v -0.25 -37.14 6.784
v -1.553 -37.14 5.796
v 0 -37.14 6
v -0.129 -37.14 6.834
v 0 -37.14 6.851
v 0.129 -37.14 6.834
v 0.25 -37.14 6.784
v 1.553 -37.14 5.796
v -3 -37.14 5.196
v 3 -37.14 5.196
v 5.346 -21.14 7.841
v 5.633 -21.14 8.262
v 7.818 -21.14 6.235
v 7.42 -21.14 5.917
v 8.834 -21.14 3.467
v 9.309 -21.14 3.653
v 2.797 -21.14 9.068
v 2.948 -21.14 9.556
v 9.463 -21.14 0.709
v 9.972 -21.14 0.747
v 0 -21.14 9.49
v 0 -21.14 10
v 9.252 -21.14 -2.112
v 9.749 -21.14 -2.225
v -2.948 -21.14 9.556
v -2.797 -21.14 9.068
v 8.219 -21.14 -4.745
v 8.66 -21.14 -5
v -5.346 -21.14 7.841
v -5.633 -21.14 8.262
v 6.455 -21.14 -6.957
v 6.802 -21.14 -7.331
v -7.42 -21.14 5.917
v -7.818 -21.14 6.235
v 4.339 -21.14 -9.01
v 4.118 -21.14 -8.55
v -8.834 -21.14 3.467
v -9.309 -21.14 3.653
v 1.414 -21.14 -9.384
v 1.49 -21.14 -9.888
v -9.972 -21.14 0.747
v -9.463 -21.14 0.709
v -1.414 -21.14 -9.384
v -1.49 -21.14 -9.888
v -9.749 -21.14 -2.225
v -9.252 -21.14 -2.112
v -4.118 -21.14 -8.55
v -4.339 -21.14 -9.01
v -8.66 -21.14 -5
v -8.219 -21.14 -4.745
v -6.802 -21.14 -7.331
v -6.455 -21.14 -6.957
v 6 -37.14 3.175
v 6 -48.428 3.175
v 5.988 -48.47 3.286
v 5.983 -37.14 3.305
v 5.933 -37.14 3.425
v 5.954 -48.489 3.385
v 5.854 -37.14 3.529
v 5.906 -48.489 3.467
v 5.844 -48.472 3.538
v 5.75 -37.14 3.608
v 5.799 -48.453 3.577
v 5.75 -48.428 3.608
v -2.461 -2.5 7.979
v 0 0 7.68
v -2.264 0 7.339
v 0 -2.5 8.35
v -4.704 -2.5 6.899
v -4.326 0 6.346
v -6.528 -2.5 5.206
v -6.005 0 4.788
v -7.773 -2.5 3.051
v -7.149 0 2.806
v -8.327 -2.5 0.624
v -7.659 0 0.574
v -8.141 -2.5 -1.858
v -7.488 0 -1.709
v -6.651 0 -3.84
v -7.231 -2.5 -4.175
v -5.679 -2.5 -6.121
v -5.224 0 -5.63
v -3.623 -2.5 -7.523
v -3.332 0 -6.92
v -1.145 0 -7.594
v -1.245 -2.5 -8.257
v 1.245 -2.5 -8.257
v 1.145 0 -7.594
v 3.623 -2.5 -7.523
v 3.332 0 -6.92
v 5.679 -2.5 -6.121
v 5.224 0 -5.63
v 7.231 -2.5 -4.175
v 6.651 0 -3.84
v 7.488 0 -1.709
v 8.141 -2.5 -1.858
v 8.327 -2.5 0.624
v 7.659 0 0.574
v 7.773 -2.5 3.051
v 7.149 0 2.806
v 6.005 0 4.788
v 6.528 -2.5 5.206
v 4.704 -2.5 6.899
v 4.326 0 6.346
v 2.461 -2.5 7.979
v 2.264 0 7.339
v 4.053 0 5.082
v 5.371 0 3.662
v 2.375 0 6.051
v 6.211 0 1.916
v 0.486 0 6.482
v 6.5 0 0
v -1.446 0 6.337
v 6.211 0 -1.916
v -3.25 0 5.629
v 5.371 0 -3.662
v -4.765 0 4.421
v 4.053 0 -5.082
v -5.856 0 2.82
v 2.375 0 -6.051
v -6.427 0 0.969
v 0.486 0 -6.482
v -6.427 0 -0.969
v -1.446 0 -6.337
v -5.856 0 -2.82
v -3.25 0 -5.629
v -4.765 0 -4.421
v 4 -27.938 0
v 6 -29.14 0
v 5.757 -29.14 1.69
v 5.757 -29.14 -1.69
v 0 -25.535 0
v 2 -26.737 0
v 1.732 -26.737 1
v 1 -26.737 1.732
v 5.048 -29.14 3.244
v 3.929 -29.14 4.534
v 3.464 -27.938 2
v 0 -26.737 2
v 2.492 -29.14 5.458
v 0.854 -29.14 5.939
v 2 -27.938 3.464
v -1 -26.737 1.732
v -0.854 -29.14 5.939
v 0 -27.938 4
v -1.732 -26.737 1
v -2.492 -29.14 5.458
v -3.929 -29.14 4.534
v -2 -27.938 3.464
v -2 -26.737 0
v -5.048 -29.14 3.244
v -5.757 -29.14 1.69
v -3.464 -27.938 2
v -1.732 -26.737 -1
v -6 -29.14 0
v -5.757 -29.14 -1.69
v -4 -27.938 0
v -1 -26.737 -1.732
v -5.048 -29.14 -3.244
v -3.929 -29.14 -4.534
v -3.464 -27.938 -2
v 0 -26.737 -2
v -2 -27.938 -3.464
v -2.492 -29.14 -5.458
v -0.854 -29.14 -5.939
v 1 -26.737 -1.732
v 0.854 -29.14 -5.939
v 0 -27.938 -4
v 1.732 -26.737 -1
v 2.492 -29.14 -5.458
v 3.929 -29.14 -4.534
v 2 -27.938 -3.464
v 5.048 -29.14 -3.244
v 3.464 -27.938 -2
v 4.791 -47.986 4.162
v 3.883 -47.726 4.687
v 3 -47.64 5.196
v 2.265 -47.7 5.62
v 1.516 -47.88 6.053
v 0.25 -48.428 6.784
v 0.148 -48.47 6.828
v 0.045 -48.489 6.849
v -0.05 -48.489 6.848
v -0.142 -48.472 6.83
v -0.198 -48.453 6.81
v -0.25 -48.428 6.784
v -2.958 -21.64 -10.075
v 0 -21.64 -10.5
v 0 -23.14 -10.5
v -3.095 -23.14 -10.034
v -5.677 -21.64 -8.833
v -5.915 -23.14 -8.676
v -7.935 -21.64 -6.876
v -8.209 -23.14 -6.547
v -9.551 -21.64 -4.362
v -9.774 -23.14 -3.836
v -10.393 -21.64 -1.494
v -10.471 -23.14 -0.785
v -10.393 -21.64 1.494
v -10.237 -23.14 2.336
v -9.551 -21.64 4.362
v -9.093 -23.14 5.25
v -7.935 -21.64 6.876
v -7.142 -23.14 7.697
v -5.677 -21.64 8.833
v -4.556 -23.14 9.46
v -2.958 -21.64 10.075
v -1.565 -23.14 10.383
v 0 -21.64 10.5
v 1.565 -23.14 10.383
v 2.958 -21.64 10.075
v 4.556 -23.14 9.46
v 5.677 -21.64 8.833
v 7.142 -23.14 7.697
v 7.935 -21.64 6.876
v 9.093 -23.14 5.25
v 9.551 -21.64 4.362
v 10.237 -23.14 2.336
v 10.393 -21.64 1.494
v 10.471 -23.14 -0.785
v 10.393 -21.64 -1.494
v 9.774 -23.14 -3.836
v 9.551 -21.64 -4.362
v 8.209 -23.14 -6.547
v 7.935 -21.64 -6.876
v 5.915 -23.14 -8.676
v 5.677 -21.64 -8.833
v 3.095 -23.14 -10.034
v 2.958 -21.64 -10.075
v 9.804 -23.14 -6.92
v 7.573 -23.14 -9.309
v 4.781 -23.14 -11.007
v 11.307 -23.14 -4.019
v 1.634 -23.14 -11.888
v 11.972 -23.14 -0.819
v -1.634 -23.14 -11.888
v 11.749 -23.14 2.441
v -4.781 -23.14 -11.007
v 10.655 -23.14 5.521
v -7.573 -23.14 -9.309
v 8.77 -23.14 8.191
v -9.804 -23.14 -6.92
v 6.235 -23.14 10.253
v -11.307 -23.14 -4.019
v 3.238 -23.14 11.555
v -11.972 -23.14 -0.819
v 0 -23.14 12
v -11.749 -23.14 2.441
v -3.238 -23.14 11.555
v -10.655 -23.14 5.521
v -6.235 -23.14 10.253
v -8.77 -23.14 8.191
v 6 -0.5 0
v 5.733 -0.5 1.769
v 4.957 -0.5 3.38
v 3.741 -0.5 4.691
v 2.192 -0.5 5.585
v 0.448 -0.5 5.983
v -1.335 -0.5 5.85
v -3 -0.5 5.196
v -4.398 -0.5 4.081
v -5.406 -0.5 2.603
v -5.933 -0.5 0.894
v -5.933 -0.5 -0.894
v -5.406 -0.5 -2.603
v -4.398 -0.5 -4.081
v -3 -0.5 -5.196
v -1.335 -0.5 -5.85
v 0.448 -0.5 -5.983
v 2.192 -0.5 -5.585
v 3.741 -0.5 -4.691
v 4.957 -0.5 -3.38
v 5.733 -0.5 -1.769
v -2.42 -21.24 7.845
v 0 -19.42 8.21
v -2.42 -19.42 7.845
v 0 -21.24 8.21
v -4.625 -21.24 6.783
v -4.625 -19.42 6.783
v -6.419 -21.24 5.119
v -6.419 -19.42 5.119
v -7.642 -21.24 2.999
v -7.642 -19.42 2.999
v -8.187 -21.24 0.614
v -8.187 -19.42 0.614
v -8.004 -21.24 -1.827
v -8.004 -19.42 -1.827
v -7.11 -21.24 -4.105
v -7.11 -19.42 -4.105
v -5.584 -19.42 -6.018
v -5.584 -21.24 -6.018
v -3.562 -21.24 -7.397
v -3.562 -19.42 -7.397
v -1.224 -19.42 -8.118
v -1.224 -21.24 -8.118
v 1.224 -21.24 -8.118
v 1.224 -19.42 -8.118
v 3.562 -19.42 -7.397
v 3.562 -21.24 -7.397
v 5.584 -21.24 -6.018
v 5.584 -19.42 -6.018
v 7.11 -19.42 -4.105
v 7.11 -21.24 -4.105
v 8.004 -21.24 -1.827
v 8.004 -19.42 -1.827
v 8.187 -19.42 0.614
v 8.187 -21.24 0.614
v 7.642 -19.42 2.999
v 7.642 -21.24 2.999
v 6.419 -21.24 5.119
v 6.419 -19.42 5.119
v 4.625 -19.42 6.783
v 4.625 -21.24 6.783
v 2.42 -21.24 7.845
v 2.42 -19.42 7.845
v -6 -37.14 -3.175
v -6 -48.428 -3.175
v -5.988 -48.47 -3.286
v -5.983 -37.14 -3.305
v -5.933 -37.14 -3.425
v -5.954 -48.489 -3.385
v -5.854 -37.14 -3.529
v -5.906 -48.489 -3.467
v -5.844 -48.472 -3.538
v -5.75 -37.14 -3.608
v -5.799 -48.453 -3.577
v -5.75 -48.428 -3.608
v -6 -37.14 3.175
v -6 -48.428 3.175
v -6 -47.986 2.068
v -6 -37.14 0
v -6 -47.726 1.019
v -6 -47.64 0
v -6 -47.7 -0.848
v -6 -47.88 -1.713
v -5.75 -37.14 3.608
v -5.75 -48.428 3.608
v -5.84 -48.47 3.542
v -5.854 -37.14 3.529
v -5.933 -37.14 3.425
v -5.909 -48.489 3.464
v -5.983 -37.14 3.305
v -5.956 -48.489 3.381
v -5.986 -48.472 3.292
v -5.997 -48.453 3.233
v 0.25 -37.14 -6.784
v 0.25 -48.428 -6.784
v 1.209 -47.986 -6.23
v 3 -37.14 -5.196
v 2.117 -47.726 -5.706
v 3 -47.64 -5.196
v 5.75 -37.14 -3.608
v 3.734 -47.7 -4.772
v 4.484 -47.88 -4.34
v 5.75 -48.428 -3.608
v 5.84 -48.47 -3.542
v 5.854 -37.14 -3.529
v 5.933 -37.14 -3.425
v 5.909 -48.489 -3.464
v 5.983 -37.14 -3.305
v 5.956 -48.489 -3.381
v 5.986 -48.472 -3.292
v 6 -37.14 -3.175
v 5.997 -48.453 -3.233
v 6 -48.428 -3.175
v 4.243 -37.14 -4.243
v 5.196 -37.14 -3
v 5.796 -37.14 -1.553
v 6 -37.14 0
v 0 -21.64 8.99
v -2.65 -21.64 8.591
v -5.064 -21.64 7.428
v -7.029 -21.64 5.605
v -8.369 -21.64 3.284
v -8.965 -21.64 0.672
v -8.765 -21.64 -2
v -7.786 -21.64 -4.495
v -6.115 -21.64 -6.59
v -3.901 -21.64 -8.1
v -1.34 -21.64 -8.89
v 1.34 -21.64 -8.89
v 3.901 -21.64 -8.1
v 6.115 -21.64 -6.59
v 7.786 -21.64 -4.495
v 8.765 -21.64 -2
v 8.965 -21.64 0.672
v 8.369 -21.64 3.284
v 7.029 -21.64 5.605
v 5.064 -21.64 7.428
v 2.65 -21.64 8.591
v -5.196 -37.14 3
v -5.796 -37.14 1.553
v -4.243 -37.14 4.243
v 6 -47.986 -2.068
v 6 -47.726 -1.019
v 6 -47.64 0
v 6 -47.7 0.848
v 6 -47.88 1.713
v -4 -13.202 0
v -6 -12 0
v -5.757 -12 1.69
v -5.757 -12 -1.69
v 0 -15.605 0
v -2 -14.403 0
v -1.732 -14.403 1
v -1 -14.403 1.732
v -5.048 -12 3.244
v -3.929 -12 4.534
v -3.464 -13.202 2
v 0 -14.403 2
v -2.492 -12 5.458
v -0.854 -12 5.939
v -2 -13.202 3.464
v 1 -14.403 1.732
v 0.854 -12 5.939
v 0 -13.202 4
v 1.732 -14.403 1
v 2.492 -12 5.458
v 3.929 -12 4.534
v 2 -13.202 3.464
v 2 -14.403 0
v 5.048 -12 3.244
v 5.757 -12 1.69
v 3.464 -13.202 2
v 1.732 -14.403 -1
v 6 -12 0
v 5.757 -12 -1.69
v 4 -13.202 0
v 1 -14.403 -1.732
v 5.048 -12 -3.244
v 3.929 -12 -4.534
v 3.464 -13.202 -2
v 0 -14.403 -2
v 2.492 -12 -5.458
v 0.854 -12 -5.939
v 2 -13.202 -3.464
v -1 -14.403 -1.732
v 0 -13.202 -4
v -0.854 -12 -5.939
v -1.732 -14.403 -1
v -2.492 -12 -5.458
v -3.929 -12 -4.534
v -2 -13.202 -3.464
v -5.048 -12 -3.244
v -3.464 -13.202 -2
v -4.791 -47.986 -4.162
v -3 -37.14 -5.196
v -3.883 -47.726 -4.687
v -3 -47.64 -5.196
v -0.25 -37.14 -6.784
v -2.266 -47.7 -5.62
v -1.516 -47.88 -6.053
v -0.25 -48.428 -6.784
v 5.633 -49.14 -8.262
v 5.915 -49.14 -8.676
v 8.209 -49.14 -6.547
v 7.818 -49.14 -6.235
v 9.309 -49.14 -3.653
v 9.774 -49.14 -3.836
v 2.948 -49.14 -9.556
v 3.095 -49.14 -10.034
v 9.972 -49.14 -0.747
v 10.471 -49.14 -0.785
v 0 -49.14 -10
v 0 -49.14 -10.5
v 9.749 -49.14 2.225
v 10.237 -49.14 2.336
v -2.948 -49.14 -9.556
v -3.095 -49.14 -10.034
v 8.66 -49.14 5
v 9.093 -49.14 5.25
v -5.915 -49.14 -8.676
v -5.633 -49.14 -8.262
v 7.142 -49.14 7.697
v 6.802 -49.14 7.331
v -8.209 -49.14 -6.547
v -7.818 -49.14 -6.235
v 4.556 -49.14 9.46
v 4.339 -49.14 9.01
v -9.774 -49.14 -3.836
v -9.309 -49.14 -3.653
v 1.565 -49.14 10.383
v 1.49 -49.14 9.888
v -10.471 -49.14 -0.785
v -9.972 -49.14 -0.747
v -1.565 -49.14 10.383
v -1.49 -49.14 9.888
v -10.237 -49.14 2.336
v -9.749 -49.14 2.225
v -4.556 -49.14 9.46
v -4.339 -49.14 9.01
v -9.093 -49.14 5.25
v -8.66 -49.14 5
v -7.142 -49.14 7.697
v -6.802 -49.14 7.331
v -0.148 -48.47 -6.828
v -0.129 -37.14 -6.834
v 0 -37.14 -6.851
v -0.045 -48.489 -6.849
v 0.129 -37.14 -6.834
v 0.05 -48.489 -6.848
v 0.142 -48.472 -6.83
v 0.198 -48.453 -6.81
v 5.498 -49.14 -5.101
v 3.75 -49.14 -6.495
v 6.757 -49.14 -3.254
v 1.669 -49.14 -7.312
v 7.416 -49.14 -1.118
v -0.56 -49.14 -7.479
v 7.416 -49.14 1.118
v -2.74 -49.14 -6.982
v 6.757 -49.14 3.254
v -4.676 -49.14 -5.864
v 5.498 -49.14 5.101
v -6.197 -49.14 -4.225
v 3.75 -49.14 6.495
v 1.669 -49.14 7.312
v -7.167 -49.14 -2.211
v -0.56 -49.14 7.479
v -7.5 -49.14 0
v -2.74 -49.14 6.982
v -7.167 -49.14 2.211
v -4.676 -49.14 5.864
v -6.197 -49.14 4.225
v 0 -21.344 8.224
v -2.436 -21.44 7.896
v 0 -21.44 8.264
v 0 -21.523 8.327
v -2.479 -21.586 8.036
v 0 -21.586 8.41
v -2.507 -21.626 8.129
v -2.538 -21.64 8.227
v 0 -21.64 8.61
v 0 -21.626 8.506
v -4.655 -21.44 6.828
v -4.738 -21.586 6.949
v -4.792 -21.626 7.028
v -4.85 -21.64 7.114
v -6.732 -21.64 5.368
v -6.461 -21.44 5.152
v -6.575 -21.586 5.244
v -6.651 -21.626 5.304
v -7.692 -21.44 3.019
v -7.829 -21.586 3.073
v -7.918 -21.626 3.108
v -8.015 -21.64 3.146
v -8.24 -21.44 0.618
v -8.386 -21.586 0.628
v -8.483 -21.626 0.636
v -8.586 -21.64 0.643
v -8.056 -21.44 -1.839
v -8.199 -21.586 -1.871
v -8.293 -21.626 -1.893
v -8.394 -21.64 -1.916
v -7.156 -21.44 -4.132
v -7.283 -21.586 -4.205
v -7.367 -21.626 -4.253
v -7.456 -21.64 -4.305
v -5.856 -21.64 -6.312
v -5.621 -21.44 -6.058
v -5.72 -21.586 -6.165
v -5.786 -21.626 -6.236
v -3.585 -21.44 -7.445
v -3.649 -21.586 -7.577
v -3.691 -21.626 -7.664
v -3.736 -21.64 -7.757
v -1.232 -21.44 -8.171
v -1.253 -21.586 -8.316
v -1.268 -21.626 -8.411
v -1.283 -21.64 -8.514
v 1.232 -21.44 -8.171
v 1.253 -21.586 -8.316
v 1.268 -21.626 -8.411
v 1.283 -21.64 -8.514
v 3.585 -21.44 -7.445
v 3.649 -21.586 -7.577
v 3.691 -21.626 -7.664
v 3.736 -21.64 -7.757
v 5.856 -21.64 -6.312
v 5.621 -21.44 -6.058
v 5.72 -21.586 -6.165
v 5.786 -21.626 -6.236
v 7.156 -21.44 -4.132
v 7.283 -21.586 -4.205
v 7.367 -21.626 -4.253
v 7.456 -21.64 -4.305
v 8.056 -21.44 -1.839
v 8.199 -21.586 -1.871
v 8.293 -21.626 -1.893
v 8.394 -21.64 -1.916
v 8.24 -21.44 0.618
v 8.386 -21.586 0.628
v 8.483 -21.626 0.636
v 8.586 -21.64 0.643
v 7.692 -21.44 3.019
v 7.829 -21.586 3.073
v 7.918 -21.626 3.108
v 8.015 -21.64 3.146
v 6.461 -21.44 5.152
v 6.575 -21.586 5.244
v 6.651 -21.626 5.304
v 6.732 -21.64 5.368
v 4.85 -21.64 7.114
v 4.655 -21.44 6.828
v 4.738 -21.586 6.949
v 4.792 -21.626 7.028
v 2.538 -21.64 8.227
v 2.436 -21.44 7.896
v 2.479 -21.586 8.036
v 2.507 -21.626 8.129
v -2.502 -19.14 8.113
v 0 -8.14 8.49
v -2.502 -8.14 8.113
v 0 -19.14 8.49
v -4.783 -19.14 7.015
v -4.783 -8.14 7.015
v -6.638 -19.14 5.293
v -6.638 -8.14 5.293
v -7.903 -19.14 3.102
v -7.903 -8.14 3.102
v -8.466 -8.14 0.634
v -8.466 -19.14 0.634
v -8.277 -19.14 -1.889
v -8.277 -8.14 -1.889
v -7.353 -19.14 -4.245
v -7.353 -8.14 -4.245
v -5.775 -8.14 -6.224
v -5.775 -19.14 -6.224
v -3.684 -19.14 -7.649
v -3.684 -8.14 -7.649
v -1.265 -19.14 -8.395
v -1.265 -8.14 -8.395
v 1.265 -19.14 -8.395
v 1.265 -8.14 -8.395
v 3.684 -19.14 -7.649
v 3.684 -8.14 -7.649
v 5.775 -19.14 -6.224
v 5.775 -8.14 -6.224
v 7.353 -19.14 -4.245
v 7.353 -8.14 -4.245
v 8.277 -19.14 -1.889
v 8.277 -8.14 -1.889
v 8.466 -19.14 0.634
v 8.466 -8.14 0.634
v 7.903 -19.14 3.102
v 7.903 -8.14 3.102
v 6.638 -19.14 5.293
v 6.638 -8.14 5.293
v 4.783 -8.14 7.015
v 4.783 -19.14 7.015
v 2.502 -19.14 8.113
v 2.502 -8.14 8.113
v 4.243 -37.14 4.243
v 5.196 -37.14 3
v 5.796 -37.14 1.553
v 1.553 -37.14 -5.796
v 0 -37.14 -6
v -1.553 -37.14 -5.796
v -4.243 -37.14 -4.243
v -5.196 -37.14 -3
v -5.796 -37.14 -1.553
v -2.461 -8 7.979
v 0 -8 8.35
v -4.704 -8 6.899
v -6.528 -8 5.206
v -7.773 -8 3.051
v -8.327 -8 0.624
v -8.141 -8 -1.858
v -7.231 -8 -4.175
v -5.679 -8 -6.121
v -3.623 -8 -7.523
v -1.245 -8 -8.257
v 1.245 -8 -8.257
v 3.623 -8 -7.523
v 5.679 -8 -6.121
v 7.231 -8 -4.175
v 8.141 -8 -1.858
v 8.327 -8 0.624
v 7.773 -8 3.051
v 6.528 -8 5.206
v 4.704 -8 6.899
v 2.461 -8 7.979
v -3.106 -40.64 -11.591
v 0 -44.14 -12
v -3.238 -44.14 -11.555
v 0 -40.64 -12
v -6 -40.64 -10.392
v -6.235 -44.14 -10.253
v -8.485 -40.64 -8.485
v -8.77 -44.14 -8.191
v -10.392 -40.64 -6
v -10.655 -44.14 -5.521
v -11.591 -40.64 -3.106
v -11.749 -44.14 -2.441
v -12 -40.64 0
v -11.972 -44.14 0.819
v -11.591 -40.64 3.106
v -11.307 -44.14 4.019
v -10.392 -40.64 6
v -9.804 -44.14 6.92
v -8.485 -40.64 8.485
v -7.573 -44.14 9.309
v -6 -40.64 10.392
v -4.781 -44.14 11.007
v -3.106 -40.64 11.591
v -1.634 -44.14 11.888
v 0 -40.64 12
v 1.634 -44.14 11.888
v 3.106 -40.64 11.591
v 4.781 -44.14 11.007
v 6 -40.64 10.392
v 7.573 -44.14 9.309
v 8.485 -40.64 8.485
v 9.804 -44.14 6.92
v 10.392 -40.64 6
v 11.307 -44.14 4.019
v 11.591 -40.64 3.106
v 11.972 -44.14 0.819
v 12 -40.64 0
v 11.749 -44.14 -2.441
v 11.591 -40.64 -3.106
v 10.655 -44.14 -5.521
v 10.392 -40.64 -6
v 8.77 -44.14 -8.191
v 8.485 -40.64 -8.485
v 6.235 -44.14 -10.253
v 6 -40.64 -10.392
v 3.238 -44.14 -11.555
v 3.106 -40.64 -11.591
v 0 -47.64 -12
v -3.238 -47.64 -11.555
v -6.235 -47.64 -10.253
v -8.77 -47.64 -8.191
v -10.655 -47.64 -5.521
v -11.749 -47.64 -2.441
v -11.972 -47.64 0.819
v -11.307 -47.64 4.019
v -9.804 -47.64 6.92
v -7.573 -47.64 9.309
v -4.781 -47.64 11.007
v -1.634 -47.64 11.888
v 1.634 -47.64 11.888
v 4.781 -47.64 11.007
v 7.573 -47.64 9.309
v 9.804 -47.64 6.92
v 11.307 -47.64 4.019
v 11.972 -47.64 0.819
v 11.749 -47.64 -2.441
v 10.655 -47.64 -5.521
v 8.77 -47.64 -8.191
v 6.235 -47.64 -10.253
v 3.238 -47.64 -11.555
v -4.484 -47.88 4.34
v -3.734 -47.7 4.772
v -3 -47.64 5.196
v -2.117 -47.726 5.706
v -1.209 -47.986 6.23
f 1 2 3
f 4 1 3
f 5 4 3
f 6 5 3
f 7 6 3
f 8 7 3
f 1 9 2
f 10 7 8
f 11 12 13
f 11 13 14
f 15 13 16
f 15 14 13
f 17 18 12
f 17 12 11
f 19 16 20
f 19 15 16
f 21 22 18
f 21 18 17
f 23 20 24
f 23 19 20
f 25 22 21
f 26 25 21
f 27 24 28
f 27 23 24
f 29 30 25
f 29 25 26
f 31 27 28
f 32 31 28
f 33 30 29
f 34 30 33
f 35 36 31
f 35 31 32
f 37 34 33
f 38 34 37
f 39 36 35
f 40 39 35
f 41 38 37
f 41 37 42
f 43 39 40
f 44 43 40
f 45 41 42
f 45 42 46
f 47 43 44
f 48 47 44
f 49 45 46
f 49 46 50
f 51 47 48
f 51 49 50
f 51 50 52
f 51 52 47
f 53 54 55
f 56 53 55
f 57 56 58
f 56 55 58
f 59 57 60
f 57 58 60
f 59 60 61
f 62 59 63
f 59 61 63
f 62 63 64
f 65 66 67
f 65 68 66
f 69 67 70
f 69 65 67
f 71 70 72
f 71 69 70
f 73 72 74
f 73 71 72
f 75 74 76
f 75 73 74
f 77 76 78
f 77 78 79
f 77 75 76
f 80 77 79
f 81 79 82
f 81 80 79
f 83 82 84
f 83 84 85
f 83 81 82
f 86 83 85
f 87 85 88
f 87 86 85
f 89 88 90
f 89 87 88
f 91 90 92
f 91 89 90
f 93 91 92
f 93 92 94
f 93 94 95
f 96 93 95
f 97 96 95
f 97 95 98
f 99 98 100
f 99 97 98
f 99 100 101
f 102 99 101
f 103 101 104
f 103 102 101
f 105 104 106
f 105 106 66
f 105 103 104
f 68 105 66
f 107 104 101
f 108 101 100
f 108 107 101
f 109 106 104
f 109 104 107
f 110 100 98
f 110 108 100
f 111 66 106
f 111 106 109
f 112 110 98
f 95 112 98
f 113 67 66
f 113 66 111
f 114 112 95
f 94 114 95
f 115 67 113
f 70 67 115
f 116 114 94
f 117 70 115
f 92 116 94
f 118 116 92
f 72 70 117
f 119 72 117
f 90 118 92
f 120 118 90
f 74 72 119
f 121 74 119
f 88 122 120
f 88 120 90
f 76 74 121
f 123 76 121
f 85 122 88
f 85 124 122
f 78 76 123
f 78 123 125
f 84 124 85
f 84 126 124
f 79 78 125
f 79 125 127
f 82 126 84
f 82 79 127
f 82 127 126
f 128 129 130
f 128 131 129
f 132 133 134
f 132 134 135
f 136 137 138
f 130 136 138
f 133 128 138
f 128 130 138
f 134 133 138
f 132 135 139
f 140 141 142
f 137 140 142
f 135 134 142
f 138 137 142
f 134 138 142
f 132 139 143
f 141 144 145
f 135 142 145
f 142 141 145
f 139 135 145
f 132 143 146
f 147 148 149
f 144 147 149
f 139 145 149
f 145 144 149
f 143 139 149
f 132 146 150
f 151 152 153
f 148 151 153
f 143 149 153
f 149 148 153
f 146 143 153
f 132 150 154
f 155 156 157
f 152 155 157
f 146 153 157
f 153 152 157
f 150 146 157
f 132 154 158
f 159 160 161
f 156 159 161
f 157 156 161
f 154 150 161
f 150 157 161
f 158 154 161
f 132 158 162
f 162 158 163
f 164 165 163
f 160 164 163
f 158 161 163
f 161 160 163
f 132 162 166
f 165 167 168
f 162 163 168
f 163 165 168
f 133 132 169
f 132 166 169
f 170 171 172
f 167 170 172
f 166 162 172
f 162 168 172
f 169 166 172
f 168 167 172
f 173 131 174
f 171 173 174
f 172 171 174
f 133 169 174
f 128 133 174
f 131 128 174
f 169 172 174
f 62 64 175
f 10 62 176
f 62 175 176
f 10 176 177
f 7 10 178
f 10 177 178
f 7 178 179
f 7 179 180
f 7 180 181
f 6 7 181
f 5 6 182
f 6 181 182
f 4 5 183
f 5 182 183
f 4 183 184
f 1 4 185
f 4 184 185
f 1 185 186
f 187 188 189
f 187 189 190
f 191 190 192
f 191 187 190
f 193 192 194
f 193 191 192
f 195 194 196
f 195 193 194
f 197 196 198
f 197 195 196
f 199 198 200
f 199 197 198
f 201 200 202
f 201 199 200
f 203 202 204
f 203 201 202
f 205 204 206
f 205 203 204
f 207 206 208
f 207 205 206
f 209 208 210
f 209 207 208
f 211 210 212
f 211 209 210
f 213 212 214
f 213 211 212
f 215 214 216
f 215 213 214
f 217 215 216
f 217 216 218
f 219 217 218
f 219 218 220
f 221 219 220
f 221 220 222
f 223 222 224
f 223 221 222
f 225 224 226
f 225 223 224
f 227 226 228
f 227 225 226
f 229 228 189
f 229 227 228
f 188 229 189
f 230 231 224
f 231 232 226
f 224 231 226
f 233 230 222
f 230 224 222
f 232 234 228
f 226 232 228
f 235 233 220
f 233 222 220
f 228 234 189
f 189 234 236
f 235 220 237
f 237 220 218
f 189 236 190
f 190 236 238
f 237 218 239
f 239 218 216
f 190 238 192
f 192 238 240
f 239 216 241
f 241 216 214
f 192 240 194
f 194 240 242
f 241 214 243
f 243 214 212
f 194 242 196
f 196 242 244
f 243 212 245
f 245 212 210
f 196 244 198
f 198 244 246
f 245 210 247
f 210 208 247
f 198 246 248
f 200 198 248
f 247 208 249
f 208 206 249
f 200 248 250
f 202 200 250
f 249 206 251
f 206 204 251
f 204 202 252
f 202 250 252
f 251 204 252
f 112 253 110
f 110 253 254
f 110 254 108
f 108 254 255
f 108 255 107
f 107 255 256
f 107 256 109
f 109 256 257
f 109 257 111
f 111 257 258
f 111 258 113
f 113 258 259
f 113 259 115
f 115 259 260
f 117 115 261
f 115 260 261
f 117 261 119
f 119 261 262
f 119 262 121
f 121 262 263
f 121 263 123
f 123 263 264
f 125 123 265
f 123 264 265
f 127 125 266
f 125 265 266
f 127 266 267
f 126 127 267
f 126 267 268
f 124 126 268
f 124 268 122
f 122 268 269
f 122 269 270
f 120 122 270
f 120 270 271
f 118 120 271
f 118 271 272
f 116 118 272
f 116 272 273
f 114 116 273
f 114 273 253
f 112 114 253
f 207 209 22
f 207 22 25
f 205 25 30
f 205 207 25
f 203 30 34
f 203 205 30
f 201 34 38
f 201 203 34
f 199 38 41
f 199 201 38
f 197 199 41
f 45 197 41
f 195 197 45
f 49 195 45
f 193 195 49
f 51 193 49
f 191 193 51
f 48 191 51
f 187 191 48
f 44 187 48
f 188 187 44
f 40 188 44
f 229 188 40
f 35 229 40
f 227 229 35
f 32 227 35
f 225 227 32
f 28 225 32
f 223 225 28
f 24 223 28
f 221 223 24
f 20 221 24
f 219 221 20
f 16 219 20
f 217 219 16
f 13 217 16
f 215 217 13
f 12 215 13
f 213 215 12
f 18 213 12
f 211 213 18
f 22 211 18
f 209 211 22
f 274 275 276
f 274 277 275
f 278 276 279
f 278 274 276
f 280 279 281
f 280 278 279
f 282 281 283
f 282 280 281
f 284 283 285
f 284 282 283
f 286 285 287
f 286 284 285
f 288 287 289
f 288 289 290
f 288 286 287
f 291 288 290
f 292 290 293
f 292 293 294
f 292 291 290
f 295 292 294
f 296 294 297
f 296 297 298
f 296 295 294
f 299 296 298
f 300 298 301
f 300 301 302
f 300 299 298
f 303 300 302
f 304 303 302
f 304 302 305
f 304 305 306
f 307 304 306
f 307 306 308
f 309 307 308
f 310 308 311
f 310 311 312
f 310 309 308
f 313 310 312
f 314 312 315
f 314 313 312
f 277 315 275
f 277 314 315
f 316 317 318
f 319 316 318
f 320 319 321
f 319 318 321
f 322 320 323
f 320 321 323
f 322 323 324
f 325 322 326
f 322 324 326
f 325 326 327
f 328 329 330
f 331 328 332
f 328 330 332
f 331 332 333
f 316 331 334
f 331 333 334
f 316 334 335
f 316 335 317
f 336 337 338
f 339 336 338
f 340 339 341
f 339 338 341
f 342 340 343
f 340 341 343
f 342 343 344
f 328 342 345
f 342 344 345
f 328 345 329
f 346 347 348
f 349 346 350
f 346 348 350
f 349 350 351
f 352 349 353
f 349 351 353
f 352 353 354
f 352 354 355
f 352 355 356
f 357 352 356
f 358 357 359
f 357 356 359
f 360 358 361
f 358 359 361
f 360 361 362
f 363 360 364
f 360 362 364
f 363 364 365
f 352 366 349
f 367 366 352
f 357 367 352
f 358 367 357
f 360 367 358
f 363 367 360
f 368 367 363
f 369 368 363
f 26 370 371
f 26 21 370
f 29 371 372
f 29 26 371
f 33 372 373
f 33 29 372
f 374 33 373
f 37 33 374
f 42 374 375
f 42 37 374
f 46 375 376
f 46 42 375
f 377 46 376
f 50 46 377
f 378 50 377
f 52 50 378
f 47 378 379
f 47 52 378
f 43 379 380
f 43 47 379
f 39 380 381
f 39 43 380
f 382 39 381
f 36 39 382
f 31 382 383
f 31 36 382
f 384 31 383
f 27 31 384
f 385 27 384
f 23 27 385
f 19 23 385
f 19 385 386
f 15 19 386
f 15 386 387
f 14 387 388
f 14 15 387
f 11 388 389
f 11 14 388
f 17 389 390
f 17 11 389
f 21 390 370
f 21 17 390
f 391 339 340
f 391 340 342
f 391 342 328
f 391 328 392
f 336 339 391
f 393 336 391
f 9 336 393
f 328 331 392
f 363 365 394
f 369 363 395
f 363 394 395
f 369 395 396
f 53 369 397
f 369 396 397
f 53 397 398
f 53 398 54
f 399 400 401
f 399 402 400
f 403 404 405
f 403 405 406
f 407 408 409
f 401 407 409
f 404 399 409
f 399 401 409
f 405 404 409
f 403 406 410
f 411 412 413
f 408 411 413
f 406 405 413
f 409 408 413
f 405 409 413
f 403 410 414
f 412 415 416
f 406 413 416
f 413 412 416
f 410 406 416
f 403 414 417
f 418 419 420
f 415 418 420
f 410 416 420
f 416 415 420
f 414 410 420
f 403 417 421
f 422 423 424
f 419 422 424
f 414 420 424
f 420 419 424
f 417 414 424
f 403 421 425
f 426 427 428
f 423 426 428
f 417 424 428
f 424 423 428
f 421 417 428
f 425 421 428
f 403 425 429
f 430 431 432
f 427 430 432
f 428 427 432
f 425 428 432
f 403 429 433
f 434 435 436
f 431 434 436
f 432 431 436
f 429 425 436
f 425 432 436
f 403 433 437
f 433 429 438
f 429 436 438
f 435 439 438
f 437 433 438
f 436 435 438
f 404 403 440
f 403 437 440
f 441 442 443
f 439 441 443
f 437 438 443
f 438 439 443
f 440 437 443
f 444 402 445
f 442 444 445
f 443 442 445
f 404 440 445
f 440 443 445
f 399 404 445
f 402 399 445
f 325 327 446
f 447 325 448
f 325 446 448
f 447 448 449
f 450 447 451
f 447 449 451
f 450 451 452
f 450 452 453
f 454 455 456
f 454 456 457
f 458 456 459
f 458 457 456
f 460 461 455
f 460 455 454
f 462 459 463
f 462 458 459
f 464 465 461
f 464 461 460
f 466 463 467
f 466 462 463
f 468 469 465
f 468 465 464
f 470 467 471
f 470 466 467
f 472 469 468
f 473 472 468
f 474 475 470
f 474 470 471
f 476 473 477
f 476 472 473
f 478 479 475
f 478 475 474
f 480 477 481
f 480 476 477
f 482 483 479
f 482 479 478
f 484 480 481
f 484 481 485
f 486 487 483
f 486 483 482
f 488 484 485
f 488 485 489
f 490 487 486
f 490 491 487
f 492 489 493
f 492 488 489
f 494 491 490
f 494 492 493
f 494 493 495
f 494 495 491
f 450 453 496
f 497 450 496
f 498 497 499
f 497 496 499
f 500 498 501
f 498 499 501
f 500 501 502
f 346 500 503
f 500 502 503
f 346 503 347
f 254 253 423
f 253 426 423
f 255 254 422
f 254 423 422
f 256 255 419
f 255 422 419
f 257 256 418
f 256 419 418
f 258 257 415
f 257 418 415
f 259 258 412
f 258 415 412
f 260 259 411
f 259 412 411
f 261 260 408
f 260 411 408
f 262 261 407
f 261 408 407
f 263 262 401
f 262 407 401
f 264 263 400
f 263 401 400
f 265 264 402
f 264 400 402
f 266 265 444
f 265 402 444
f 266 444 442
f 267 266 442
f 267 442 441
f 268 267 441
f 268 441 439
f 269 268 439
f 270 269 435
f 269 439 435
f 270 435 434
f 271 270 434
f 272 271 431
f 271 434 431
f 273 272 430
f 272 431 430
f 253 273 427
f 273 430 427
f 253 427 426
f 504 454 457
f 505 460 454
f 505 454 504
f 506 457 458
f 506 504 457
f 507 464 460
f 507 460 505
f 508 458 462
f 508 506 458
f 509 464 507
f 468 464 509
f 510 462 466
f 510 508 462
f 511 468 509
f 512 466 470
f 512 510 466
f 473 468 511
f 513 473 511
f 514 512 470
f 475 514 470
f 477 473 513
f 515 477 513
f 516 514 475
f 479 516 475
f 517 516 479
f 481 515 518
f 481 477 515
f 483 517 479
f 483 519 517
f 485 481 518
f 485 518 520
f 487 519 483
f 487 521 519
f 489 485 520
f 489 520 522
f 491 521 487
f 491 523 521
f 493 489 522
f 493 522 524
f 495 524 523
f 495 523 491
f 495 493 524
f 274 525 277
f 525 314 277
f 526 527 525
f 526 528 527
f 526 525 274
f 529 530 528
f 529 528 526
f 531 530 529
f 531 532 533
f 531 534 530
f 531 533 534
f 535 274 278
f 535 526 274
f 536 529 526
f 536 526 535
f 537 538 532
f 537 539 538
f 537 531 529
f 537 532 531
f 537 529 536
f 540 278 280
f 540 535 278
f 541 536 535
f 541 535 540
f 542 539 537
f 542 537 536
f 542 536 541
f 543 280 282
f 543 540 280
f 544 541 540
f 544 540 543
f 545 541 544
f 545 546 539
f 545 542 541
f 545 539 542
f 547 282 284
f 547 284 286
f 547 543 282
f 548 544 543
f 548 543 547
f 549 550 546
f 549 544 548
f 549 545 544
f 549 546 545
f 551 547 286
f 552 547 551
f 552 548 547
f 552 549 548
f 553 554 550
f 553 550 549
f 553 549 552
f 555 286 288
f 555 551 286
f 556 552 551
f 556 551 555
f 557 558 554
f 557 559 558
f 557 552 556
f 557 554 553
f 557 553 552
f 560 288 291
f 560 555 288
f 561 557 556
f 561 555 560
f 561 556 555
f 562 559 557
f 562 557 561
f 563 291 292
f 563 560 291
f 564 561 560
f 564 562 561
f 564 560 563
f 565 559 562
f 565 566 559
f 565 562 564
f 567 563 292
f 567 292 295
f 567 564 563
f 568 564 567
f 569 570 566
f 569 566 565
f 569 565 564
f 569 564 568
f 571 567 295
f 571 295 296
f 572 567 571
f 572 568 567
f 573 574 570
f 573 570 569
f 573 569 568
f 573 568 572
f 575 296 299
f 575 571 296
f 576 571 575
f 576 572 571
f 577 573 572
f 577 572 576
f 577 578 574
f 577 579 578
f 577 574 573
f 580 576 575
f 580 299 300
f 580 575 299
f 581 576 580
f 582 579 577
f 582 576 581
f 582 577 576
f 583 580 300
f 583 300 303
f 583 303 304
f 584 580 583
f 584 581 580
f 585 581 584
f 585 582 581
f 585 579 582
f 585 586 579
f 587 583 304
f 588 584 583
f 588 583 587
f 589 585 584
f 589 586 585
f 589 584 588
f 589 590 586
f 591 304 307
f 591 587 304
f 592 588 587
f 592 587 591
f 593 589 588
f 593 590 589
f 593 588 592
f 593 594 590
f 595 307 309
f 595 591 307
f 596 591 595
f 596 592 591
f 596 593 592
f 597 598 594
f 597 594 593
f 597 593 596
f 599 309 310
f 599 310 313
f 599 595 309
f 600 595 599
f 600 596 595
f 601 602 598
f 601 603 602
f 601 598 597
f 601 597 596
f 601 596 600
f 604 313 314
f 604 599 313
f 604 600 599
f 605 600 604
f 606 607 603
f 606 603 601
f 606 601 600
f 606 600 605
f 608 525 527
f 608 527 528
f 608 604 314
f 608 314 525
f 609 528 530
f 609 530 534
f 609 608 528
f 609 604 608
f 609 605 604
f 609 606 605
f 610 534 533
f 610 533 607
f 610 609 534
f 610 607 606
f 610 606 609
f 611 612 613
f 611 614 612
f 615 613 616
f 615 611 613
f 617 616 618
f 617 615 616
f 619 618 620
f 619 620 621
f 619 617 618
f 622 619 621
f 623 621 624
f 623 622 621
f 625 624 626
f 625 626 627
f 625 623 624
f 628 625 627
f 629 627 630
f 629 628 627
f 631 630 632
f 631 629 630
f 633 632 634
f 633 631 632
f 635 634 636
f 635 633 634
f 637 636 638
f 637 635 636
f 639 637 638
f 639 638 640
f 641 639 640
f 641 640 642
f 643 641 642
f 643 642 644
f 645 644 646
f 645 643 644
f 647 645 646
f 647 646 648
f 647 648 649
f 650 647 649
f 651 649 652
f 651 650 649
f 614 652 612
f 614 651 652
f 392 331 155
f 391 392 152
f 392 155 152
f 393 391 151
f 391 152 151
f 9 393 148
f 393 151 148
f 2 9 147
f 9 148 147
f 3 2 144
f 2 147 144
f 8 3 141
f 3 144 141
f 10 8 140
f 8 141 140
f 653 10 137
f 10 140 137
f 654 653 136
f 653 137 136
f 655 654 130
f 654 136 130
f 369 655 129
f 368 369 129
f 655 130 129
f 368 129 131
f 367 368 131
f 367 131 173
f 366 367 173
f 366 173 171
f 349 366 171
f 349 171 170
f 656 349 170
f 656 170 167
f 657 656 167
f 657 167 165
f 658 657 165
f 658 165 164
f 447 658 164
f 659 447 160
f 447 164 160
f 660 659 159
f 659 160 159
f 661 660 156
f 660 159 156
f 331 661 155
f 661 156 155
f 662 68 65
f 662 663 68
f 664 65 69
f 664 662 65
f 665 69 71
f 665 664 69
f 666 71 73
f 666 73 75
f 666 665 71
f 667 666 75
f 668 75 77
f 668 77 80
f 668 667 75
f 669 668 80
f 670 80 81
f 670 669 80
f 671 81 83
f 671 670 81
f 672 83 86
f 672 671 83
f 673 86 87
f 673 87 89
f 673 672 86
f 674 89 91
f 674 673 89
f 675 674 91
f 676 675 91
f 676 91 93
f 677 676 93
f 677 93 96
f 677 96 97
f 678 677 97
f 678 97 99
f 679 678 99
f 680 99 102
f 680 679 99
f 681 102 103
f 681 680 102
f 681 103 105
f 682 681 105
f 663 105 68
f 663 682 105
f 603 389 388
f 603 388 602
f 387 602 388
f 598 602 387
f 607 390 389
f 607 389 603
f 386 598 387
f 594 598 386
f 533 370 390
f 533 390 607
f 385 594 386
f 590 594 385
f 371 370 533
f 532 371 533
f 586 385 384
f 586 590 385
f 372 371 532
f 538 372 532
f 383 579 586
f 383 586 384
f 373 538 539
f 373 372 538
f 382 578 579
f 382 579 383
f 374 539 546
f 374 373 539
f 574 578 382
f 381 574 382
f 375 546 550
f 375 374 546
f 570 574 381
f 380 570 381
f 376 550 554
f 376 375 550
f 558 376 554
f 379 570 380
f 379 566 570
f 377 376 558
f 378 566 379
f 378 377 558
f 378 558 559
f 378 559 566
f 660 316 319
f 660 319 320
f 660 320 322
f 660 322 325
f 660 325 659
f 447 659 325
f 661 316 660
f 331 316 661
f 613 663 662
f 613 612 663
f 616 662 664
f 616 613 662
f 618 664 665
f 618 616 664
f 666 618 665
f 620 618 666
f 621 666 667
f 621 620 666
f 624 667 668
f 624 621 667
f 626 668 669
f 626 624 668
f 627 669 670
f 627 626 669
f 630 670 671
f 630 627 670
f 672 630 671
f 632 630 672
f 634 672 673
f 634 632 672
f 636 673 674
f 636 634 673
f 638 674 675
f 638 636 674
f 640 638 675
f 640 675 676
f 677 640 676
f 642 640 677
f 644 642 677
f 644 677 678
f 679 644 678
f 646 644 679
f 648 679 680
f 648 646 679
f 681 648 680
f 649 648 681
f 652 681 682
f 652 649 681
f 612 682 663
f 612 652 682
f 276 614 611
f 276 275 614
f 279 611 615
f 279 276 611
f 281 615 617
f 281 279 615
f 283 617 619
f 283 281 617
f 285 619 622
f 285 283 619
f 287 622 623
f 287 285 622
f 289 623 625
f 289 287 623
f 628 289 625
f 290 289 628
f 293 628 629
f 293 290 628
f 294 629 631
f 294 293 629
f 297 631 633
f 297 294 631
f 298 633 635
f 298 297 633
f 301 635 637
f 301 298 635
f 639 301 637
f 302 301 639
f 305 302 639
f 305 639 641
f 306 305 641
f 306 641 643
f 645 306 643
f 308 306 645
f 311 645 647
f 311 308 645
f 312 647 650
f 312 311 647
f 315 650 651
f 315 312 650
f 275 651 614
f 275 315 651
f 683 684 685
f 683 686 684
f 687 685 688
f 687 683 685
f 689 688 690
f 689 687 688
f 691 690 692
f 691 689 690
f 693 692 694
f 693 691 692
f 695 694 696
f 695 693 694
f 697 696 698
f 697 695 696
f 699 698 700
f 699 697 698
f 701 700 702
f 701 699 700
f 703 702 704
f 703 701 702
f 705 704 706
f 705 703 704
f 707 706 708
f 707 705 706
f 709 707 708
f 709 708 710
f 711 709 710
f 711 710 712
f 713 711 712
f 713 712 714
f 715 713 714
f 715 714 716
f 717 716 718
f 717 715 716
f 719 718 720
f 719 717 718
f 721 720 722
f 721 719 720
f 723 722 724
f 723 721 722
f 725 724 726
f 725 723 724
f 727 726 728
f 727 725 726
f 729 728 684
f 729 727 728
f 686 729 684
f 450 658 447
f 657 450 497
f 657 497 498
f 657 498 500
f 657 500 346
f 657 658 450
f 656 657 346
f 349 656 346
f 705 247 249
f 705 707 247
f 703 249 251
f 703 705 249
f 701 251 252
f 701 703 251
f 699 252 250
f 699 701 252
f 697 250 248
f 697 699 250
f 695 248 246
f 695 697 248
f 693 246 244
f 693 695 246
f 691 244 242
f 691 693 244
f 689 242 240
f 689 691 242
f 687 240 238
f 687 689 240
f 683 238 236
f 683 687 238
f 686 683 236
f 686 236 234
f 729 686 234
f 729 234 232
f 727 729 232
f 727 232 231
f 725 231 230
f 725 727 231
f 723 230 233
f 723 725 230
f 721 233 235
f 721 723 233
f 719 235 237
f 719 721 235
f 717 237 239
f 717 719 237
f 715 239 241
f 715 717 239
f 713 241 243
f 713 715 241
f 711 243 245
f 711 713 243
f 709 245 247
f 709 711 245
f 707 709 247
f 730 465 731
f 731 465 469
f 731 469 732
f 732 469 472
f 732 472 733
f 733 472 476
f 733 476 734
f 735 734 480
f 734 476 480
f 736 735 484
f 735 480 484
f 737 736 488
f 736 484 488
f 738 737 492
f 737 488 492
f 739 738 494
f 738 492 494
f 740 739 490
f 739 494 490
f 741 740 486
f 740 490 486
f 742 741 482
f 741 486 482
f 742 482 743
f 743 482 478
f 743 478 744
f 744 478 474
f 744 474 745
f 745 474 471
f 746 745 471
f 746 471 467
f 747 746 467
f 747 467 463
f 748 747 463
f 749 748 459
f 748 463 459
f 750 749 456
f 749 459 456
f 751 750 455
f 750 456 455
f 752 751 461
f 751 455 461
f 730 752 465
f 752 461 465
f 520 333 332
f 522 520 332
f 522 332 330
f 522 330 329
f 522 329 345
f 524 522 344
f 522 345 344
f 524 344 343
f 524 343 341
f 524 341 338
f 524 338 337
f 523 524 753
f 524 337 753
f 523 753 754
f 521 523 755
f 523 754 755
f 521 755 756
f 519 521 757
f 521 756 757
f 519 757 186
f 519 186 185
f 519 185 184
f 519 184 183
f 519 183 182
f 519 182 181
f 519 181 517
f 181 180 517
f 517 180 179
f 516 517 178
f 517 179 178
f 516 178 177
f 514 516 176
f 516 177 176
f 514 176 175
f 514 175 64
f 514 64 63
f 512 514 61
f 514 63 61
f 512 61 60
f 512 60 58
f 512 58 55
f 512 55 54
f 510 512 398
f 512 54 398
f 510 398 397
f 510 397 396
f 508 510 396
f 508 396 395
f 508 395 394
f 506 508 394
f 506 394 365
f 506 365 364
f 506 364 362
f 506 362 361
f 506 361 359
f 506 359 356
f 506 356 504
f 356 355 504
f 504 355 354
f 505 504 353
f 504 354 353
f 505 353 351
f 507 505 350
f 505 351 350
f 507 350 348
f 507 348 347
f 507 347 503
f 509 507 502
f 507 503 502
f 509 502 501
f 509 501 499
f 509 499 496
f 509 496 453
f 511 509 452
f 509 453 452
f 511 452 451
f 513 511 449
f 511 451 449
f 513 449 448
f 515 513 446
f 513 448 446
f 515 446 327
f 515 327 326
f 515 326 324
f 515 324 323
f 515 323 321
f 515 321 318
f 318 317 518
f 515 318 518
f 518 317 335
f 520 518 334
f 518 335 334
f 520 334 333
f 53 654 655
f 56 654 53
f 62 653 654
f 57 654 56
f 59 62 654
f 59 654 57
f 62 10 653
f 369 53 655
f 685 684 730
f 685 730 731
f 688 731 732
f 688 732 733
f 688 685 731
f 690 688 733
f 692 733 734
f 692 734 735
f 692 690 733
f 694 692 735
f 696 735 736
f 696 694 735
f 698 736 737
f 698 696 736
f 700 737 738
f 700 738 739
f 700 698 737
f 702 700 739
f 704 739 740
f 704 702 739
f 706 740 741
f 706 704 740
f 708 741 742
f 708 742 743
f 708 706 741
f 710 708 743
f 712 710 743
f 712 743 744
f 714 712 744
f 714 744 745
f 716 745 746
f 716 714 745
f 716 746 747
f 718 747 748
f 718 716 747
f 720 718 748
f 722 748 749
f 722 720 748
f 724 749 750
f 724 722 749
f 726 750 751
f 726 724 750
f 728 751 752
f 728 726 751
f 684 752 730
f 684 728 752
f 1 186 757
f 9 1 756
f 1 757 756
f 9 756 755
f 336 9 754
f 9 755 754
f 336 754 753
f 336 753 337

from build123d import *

# Parameters (mm, degrees)
PER_AGE_T_TE_D           = 12
PER_AGE_T_TE_DEPTH       = 20
PER_AGE_T_TE_CSINK_D     = 15
PER_AGE_T_TE_CSINK_ANGLE = 90
PER_AGE_T_TE_TIP         = 3.605163714
H_XAGONE_DEPTH           = 12
CENTRAGE_D               = 3
CENTRAGE_DEPTH           = 6
CENTRAGE_CSINK_D         = 5
CENTRAGE_CSINK_ANGLE     = 60
CENTRAGE_TIP             = 0.901290929
PER_AGE_AXE_D            = 12
PER_AGE_AXE_DEPTH        = 12
PER_AGE_AXE_CSINK_D      = 13
PER_AGE_AXE_CSINK_ANGLE  = 90
PER_AGE_AXE_TIP          = 3.605163714
ESQUISSE9_W              = 7
ESQUISSE9_H              = 8.5
ESQUISSE9_W_2            = 1.5
ESQUISSE9_H_2            = 2
ESQUISSE10_W             = 2
ESQUISSE10_H             = 8.5
CHANFREIN1_SIZE          = 1.5


with BuildPart() as part:
    # Esquisse1 → Base-Révolution (revolve)
    with BuildSketch(Plane.XY, mode=Mode.PRIVATE) as base_r_volution_sk:
        with BuildLine():
            Line((0, 0), (7.680127019, 0))
            Line((7.680127019, 0), (8.35, -2.5))
            Line((8.35, -2.5), (8.35, -8))
            Line((8.35, -8), (8.49, -8.14))
            Line((8.49, -8.14), (8.49, -19.14))
            Line((8.49, -19.14), (8.21, -19.42))
            Line((8.21, -19.42), (8.21, -21.24))
            ThreePointArc((8.21, -21.24), (8.327157288, -21.522842712), (8.61, -21.64))
            Line((8.61, -21.64), (8.99, -21.64))
            Line((8.99, -21.64), (9.49, -21.14))
            Line((9.49, -21.14), (10, -21.14))
            Line((10, -21.14), (12, -23.14))
            Line((12, -23.14), (12, -40.64))
            Line((12, -40.64), (10, -42.64))
            Line((10, -42.64), (10, -43.14))
            ThreePointArc((10, -43.14), (10.292893219, -43.847106781), (11, -44.14))
            Line((11, -44.14), (19, -44.14))
            Line((19, -44.14), (19, -45.14))
            Line((19, -45.14), (12.07179677, -49.14))
            Line((12.07179677, -49.14), (0, -49.14))
            Line((0, -49.14), (0, 0))
        make_face()
    revolve(base_r_volution_sk.sketch.rotate(Axis((0, -10, 0), (0, -1, 0)), 90), axis=Axis((0, -10, 0), (0, -1, 0)))

    # Perçage tête
    with Locations(Plane.XZ.offset(49.14)):
        with Locations((0, 0)):
            CounterSinkHole(PER_AGE_T_TE_D / 2, PER_AGE_T_TE_CSINK_D / 2, depth=PER_AGE_T_TE_DEPTH, counter_sink_angle=PER_AGE_T_TE_CSINK_ANGLE)
            with Locations((0, 0, -(PER_AGE_T_TE_DEPTH + PER_AGE_T_TE_TIP / 2))):  # 118° drill point
                Cone(0, PER_AGE_T_TE_D / 2, PER_AGE_T_TE_TIP, mode=Mode.SUBTRACT)

    # Esquisse4 → Héxagone (cut)
    with BuildSketch(Plane.XZ.offset(49.14)):
        with BuildLine():
            Line((-0.25, 6.783865663), (-5.75, 3.608439182))
            ThreePointArc((-5.75, 3.608439182), (-5.933012702, 3.425426481), (-6, 3.175426481))
            Line((-6, 3.175426481), (-6, -3.175426481))
            ThreePointArc((-6, -3.175426481), (-5.933012702, -3.425426481), (-5.75, -3.608439182))
            Line((-5.75, -3.608439182), (-0.25, -6.783865663))
            ThreePointArc((-0.25, -6.783865663), (0, -6.850852961), (0.25, -6.783865663))
            Line((0.25, -6.783865663), (5.75, -3.608439182))
            ThreePointArc((5.75, -3.608439182), (5.933012702, -3.425426481), (6, -3.175426481))
            Line((6, -3.175426481), (6, 3.175426481))
            ThreePointArc((6, 3.175426481), (5.933012702, 3.425426481), (5.75, 3.608439182))
            Line((5.75, 3.608439182), (0.25, 6.783865663))
            ThreePointArc((0.25, 6.783865663), (0, 6.850852961), (-0.25, 6.783865663))
        make_face()
    extrude(amount=-H_XAGONE_DEPTH, mode=Mode.SUBTRACT)

    # Centrage
    with Locations(Plane(origin=(0, 0, 0), x_dir=(-1, 0, 0), z_dir=(0, 1, 0))):
        with Locations((0, 0)):
            CounterSinkHole(CENTRAGE_D / 2, CENTRAGE_CSINK_D / 2, depth=CENTRAGE_DEPTH, counter_sink_angle=CENTRAGE_CSINK_ANGLE)
            with Locations((0, 0, -(CENTRAGE_DEPTH + CENTRAGE_TIP / 2))):  # 118° drill point
                Cone(0, CENTRAGE_D / 2, CENTRAGE_TIP, mode=Mode.SUBTRACT)

    # Perçage axe
    with Locations(Plane(origin=(0, 0, 0), x_dir=(-1, 0, 0), z_dir=(0, 1, 0))):
        with Locations((0, 0)):
            CounterSinkHole(PER_AGE_AXE_D / 2, PER_AGE_AXE_CSINK_D / 2, depth=PER_AGE_AXE_DEPTH, counter_sink_angle=PER_AGE_AXE_CSINK_ANGLE)
            with Locations((0, 0, -(PER_AGE_AXE_DEPTH + PER_AGE_AXE_TIP / 2))):  # 118° drill point
                Cone(0, PER_AGE_AXE_D / 2, PER_AGE_AXE_TIP, mode=Mode.SUBTRACT)

    # Esquisse9 → Enlèvement tête (revolve, cut)
    with BuildSketch(Plane.XY, mode=Mode.PRIVATE) as enl_vement_t_te_sk:
        with Locations((15.5, -44.89)):
            Rectangle(ESQUISSE9_W, ESQUISSE9_H)
        with Locations((11.25, -22.14)):
            Rectangle(ESQUISSE9_W_2, ESQUISSE9_H_2)
    revolve(enl_vement_t_te_sk.sketch.rotate(Axis((0, -50, 0), (0, 1, 0)), 90), axis=Axis((0, -50, 0), (0, 1, 0)), mode=Mode.SUBTRACT)

    # Esquisse10 → Suppression gorge (revolve)
    with BuildSketch(Plane.XY, mode=Mode.PRIVATE) as suppression_gorge_sk:
        with Locations((11, -44.89)):
            Rectangle(ESQUISSE10_W, ESQUISSE10_H)
    revolve(suppression_gorge_sk.sketch.rotate(Axis((0, -47.996933622, 0), (0, 1, 0)), 90), axis=Axis((0, -47.996933622, 0), (0, 1, 0)))

    # Chanfrein1
    chanfrein1_edges = [part.edges().sort_by_distance(p)[0] for p in [
        (0, -49.14, 12),
    ]]
    chamfer(chanfrein1_edges, length=CHANFREIN1_SIZE)


solid = part.part
